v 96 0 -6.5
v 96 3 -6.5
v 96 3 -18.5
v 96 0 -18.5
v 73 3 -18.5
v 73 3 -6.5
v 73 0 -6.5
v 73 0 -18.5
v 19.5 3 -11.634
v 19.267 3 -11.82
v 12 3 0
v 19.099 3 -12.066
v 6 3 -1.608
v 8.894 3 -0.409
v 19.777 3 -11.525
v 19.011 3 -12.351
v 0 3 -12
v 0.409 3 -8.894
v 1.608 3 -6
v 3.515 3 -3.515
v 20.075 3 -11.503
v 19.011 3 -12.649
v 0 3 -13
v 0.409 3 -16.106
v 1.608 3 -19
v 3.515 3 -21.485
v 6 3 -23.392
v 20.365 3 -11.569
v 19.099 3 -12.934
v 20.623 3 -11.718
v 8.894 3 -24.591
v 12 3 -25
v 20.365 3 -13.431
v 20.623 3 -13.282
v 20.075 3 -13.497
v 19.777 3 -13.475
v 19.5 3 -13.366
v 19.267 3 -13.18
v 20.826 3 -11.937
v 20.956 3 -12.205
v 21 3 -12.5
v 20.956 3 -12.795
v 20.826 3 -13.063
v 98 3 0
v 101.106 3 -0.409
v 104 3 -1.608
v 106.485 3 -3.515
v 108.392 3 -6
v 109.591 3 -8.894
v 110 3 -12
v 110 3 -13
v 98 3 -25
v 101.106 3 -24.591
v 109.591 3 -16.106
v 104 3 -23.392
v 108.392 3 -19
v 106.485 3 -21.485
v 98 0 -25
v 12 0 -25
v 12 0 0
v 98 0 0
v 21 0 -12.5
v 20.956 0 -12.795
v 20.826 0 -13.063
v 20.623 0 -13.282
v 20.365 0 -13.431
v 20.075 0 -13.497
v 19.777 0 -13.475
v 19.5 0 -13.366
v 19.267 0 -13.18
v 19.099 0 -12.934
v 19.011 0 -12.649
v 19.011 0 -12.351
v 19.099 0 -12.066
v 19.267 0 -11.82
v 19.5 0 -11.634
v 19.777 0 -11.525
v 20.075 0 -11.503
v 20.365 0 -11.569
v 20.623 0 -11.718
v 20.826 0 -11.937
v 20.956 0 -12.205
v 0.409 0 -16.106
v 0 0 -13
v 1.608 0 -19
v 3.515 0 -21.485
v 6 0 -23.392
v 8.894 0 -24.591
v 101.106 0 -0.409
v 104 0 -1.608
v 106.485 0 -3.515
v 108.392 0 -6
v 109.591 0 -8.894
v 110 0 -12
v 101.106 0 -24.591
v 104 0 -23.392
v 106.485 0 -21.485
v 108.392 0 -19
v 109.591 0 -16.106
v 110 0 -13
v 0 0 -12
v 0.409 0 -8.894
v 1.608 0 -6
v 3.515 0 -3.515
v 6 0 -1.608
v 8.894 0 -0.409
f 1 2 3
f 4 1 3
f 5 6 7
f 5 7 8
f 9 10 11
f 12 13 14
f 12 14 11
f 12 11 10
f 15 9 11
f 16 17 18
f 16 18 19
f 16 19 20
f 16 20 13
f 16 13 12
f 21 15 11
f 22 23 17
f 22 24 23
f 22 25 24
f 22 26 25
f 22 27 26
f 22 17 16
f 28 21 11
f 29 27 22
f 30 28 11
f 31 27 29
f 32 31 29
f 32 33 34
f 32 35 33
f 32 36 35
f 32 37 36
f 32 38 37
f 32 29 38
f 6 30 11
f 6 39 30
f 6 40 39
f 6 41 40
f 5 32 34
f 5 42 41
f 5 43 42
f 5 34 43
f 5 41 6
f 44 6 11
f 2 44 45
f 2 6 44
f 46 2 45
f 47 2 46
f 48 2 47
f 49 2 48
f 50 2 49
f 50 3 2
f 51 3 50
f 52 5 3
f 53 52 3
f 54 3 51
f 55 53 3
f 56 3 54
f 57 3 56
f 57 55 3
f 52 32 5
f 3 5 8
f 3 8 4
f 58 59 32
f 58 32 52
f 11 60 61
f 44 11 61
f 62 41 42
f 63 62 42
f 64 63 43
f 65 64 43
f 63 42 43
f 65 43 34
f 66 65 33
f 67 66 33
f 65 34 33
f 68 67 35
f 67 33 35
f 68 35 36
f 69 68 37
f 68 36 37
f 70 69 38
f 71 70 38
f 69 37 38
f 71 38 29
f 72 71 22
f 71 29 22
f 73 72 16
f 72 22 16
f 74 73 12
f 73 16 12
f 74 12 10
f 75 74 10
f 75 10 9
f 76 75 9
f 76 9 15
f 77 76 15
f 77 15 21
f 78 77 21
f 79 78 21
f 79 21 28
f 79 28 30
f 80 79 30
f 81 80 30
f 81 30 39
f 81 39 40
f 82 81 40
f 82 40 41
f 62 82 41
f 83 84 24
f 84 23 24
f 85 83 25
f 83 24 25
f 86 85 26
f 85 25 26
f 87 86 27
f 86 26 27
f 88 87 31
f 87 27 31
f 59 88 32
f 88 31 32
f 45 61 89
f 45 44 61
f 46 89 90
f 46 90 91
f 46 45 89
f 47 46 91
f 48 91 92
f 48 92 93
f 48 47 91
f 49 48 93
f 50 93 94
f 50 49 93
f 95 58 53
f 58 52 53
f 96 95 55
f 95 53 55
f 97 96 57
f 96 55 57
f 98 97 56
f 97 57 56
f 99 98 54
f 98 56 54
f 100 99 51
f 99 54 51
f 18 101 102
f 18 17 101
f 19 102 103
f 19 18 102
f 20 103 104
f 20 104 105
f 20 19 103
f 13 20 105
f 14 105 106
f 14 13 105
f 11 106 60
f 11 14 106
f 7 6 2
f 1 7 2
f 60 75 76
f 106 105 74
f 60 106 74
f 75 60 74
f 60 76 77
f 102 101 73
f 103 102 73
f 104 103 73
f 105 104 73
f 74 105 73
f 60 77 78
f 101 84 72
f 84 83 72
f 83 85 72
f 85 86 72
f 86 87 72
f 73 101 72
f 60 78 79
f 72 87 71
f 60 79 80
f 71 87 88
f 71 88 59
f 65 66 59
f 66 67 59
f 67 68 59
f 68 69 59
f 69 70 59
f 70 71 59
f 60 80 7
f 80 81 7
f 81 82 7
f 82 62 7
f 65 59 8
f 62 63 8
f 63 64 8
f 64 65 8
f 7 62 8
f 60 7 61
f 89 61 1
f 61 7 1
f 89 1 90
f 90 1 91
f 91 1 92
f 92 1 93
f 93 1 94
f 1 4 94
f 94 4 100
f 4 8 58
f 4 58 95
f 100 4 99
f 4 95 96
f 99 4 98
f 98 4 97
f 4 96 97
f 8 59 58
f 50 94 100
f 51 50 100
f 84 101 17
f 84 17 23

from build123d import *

# Parameters (mm, degrees)
SKETCH1_W           = 110
SKETCH1_H           = 25
BOSS_EXTRUDE1_DEPTH = 3
SKETCH2_W           = 23
SKETCH2_H           = 12
CUT_EXTRUDE1_DEPTH  = 4
SKETCH3_R           = 1
CUT_EXTRUDE2_DEPTH  = 4
FILLET1_R           = 12


with BuildPart() as part:
    # Sketch1 → Boss-Extrude1 (new body)
    with BuildSketch(Plane(origin=(0, 0, 0), x_dir=(1, 0, 0), z_dir=(0, 1, 0))):
        with Locations((55, 12.5)):
            Rectangle(SKETCH1_W, SKETCH1_H)
    extrude(amount=BOSS_EXTRUDE1_DEPTH)

    # Sketch2 → Cut-Extrude1 (cut, through all)
    with BuildSketch(Plane(origin=(0, 3, 0), x_dir=(1, 0, 0), z_dir=(0, 1, 0))):
        with Locations((84.5, 12.5)):
            Rectangle(SKETCH2_W, SKETCH2_H)
    extrude(amount=-CUT_EXTRUDE1_DEPTH, mode=Mode.SUBTRACT)

    # Sketch3 → Cut-Extrude2 (cut, through all)
    with BuildSketch(Plane(origin=(0, 3, 0), x_dir=(1, 0, 0), z_dir=(0, 1, 0))):
        with Locations((20, 12.5)):
            Circle(SKETCH3_R)
    extrude(amount=-CUT_EXTRUDE2_DEPTH, mode=Mode.SUBTRACT)

    # Fillet1
    fillet1_edges = [part.edges().sort_by_distance(p)[0] for p in [
        (0, 1.5, -25),
        (110, 1.5, -25),
        (110, 1.5, 0),
        (0, 1.5, 0),
    ]]
    fillet(fillet1_edges, radius=FILLET1_R)


solid = part.part
